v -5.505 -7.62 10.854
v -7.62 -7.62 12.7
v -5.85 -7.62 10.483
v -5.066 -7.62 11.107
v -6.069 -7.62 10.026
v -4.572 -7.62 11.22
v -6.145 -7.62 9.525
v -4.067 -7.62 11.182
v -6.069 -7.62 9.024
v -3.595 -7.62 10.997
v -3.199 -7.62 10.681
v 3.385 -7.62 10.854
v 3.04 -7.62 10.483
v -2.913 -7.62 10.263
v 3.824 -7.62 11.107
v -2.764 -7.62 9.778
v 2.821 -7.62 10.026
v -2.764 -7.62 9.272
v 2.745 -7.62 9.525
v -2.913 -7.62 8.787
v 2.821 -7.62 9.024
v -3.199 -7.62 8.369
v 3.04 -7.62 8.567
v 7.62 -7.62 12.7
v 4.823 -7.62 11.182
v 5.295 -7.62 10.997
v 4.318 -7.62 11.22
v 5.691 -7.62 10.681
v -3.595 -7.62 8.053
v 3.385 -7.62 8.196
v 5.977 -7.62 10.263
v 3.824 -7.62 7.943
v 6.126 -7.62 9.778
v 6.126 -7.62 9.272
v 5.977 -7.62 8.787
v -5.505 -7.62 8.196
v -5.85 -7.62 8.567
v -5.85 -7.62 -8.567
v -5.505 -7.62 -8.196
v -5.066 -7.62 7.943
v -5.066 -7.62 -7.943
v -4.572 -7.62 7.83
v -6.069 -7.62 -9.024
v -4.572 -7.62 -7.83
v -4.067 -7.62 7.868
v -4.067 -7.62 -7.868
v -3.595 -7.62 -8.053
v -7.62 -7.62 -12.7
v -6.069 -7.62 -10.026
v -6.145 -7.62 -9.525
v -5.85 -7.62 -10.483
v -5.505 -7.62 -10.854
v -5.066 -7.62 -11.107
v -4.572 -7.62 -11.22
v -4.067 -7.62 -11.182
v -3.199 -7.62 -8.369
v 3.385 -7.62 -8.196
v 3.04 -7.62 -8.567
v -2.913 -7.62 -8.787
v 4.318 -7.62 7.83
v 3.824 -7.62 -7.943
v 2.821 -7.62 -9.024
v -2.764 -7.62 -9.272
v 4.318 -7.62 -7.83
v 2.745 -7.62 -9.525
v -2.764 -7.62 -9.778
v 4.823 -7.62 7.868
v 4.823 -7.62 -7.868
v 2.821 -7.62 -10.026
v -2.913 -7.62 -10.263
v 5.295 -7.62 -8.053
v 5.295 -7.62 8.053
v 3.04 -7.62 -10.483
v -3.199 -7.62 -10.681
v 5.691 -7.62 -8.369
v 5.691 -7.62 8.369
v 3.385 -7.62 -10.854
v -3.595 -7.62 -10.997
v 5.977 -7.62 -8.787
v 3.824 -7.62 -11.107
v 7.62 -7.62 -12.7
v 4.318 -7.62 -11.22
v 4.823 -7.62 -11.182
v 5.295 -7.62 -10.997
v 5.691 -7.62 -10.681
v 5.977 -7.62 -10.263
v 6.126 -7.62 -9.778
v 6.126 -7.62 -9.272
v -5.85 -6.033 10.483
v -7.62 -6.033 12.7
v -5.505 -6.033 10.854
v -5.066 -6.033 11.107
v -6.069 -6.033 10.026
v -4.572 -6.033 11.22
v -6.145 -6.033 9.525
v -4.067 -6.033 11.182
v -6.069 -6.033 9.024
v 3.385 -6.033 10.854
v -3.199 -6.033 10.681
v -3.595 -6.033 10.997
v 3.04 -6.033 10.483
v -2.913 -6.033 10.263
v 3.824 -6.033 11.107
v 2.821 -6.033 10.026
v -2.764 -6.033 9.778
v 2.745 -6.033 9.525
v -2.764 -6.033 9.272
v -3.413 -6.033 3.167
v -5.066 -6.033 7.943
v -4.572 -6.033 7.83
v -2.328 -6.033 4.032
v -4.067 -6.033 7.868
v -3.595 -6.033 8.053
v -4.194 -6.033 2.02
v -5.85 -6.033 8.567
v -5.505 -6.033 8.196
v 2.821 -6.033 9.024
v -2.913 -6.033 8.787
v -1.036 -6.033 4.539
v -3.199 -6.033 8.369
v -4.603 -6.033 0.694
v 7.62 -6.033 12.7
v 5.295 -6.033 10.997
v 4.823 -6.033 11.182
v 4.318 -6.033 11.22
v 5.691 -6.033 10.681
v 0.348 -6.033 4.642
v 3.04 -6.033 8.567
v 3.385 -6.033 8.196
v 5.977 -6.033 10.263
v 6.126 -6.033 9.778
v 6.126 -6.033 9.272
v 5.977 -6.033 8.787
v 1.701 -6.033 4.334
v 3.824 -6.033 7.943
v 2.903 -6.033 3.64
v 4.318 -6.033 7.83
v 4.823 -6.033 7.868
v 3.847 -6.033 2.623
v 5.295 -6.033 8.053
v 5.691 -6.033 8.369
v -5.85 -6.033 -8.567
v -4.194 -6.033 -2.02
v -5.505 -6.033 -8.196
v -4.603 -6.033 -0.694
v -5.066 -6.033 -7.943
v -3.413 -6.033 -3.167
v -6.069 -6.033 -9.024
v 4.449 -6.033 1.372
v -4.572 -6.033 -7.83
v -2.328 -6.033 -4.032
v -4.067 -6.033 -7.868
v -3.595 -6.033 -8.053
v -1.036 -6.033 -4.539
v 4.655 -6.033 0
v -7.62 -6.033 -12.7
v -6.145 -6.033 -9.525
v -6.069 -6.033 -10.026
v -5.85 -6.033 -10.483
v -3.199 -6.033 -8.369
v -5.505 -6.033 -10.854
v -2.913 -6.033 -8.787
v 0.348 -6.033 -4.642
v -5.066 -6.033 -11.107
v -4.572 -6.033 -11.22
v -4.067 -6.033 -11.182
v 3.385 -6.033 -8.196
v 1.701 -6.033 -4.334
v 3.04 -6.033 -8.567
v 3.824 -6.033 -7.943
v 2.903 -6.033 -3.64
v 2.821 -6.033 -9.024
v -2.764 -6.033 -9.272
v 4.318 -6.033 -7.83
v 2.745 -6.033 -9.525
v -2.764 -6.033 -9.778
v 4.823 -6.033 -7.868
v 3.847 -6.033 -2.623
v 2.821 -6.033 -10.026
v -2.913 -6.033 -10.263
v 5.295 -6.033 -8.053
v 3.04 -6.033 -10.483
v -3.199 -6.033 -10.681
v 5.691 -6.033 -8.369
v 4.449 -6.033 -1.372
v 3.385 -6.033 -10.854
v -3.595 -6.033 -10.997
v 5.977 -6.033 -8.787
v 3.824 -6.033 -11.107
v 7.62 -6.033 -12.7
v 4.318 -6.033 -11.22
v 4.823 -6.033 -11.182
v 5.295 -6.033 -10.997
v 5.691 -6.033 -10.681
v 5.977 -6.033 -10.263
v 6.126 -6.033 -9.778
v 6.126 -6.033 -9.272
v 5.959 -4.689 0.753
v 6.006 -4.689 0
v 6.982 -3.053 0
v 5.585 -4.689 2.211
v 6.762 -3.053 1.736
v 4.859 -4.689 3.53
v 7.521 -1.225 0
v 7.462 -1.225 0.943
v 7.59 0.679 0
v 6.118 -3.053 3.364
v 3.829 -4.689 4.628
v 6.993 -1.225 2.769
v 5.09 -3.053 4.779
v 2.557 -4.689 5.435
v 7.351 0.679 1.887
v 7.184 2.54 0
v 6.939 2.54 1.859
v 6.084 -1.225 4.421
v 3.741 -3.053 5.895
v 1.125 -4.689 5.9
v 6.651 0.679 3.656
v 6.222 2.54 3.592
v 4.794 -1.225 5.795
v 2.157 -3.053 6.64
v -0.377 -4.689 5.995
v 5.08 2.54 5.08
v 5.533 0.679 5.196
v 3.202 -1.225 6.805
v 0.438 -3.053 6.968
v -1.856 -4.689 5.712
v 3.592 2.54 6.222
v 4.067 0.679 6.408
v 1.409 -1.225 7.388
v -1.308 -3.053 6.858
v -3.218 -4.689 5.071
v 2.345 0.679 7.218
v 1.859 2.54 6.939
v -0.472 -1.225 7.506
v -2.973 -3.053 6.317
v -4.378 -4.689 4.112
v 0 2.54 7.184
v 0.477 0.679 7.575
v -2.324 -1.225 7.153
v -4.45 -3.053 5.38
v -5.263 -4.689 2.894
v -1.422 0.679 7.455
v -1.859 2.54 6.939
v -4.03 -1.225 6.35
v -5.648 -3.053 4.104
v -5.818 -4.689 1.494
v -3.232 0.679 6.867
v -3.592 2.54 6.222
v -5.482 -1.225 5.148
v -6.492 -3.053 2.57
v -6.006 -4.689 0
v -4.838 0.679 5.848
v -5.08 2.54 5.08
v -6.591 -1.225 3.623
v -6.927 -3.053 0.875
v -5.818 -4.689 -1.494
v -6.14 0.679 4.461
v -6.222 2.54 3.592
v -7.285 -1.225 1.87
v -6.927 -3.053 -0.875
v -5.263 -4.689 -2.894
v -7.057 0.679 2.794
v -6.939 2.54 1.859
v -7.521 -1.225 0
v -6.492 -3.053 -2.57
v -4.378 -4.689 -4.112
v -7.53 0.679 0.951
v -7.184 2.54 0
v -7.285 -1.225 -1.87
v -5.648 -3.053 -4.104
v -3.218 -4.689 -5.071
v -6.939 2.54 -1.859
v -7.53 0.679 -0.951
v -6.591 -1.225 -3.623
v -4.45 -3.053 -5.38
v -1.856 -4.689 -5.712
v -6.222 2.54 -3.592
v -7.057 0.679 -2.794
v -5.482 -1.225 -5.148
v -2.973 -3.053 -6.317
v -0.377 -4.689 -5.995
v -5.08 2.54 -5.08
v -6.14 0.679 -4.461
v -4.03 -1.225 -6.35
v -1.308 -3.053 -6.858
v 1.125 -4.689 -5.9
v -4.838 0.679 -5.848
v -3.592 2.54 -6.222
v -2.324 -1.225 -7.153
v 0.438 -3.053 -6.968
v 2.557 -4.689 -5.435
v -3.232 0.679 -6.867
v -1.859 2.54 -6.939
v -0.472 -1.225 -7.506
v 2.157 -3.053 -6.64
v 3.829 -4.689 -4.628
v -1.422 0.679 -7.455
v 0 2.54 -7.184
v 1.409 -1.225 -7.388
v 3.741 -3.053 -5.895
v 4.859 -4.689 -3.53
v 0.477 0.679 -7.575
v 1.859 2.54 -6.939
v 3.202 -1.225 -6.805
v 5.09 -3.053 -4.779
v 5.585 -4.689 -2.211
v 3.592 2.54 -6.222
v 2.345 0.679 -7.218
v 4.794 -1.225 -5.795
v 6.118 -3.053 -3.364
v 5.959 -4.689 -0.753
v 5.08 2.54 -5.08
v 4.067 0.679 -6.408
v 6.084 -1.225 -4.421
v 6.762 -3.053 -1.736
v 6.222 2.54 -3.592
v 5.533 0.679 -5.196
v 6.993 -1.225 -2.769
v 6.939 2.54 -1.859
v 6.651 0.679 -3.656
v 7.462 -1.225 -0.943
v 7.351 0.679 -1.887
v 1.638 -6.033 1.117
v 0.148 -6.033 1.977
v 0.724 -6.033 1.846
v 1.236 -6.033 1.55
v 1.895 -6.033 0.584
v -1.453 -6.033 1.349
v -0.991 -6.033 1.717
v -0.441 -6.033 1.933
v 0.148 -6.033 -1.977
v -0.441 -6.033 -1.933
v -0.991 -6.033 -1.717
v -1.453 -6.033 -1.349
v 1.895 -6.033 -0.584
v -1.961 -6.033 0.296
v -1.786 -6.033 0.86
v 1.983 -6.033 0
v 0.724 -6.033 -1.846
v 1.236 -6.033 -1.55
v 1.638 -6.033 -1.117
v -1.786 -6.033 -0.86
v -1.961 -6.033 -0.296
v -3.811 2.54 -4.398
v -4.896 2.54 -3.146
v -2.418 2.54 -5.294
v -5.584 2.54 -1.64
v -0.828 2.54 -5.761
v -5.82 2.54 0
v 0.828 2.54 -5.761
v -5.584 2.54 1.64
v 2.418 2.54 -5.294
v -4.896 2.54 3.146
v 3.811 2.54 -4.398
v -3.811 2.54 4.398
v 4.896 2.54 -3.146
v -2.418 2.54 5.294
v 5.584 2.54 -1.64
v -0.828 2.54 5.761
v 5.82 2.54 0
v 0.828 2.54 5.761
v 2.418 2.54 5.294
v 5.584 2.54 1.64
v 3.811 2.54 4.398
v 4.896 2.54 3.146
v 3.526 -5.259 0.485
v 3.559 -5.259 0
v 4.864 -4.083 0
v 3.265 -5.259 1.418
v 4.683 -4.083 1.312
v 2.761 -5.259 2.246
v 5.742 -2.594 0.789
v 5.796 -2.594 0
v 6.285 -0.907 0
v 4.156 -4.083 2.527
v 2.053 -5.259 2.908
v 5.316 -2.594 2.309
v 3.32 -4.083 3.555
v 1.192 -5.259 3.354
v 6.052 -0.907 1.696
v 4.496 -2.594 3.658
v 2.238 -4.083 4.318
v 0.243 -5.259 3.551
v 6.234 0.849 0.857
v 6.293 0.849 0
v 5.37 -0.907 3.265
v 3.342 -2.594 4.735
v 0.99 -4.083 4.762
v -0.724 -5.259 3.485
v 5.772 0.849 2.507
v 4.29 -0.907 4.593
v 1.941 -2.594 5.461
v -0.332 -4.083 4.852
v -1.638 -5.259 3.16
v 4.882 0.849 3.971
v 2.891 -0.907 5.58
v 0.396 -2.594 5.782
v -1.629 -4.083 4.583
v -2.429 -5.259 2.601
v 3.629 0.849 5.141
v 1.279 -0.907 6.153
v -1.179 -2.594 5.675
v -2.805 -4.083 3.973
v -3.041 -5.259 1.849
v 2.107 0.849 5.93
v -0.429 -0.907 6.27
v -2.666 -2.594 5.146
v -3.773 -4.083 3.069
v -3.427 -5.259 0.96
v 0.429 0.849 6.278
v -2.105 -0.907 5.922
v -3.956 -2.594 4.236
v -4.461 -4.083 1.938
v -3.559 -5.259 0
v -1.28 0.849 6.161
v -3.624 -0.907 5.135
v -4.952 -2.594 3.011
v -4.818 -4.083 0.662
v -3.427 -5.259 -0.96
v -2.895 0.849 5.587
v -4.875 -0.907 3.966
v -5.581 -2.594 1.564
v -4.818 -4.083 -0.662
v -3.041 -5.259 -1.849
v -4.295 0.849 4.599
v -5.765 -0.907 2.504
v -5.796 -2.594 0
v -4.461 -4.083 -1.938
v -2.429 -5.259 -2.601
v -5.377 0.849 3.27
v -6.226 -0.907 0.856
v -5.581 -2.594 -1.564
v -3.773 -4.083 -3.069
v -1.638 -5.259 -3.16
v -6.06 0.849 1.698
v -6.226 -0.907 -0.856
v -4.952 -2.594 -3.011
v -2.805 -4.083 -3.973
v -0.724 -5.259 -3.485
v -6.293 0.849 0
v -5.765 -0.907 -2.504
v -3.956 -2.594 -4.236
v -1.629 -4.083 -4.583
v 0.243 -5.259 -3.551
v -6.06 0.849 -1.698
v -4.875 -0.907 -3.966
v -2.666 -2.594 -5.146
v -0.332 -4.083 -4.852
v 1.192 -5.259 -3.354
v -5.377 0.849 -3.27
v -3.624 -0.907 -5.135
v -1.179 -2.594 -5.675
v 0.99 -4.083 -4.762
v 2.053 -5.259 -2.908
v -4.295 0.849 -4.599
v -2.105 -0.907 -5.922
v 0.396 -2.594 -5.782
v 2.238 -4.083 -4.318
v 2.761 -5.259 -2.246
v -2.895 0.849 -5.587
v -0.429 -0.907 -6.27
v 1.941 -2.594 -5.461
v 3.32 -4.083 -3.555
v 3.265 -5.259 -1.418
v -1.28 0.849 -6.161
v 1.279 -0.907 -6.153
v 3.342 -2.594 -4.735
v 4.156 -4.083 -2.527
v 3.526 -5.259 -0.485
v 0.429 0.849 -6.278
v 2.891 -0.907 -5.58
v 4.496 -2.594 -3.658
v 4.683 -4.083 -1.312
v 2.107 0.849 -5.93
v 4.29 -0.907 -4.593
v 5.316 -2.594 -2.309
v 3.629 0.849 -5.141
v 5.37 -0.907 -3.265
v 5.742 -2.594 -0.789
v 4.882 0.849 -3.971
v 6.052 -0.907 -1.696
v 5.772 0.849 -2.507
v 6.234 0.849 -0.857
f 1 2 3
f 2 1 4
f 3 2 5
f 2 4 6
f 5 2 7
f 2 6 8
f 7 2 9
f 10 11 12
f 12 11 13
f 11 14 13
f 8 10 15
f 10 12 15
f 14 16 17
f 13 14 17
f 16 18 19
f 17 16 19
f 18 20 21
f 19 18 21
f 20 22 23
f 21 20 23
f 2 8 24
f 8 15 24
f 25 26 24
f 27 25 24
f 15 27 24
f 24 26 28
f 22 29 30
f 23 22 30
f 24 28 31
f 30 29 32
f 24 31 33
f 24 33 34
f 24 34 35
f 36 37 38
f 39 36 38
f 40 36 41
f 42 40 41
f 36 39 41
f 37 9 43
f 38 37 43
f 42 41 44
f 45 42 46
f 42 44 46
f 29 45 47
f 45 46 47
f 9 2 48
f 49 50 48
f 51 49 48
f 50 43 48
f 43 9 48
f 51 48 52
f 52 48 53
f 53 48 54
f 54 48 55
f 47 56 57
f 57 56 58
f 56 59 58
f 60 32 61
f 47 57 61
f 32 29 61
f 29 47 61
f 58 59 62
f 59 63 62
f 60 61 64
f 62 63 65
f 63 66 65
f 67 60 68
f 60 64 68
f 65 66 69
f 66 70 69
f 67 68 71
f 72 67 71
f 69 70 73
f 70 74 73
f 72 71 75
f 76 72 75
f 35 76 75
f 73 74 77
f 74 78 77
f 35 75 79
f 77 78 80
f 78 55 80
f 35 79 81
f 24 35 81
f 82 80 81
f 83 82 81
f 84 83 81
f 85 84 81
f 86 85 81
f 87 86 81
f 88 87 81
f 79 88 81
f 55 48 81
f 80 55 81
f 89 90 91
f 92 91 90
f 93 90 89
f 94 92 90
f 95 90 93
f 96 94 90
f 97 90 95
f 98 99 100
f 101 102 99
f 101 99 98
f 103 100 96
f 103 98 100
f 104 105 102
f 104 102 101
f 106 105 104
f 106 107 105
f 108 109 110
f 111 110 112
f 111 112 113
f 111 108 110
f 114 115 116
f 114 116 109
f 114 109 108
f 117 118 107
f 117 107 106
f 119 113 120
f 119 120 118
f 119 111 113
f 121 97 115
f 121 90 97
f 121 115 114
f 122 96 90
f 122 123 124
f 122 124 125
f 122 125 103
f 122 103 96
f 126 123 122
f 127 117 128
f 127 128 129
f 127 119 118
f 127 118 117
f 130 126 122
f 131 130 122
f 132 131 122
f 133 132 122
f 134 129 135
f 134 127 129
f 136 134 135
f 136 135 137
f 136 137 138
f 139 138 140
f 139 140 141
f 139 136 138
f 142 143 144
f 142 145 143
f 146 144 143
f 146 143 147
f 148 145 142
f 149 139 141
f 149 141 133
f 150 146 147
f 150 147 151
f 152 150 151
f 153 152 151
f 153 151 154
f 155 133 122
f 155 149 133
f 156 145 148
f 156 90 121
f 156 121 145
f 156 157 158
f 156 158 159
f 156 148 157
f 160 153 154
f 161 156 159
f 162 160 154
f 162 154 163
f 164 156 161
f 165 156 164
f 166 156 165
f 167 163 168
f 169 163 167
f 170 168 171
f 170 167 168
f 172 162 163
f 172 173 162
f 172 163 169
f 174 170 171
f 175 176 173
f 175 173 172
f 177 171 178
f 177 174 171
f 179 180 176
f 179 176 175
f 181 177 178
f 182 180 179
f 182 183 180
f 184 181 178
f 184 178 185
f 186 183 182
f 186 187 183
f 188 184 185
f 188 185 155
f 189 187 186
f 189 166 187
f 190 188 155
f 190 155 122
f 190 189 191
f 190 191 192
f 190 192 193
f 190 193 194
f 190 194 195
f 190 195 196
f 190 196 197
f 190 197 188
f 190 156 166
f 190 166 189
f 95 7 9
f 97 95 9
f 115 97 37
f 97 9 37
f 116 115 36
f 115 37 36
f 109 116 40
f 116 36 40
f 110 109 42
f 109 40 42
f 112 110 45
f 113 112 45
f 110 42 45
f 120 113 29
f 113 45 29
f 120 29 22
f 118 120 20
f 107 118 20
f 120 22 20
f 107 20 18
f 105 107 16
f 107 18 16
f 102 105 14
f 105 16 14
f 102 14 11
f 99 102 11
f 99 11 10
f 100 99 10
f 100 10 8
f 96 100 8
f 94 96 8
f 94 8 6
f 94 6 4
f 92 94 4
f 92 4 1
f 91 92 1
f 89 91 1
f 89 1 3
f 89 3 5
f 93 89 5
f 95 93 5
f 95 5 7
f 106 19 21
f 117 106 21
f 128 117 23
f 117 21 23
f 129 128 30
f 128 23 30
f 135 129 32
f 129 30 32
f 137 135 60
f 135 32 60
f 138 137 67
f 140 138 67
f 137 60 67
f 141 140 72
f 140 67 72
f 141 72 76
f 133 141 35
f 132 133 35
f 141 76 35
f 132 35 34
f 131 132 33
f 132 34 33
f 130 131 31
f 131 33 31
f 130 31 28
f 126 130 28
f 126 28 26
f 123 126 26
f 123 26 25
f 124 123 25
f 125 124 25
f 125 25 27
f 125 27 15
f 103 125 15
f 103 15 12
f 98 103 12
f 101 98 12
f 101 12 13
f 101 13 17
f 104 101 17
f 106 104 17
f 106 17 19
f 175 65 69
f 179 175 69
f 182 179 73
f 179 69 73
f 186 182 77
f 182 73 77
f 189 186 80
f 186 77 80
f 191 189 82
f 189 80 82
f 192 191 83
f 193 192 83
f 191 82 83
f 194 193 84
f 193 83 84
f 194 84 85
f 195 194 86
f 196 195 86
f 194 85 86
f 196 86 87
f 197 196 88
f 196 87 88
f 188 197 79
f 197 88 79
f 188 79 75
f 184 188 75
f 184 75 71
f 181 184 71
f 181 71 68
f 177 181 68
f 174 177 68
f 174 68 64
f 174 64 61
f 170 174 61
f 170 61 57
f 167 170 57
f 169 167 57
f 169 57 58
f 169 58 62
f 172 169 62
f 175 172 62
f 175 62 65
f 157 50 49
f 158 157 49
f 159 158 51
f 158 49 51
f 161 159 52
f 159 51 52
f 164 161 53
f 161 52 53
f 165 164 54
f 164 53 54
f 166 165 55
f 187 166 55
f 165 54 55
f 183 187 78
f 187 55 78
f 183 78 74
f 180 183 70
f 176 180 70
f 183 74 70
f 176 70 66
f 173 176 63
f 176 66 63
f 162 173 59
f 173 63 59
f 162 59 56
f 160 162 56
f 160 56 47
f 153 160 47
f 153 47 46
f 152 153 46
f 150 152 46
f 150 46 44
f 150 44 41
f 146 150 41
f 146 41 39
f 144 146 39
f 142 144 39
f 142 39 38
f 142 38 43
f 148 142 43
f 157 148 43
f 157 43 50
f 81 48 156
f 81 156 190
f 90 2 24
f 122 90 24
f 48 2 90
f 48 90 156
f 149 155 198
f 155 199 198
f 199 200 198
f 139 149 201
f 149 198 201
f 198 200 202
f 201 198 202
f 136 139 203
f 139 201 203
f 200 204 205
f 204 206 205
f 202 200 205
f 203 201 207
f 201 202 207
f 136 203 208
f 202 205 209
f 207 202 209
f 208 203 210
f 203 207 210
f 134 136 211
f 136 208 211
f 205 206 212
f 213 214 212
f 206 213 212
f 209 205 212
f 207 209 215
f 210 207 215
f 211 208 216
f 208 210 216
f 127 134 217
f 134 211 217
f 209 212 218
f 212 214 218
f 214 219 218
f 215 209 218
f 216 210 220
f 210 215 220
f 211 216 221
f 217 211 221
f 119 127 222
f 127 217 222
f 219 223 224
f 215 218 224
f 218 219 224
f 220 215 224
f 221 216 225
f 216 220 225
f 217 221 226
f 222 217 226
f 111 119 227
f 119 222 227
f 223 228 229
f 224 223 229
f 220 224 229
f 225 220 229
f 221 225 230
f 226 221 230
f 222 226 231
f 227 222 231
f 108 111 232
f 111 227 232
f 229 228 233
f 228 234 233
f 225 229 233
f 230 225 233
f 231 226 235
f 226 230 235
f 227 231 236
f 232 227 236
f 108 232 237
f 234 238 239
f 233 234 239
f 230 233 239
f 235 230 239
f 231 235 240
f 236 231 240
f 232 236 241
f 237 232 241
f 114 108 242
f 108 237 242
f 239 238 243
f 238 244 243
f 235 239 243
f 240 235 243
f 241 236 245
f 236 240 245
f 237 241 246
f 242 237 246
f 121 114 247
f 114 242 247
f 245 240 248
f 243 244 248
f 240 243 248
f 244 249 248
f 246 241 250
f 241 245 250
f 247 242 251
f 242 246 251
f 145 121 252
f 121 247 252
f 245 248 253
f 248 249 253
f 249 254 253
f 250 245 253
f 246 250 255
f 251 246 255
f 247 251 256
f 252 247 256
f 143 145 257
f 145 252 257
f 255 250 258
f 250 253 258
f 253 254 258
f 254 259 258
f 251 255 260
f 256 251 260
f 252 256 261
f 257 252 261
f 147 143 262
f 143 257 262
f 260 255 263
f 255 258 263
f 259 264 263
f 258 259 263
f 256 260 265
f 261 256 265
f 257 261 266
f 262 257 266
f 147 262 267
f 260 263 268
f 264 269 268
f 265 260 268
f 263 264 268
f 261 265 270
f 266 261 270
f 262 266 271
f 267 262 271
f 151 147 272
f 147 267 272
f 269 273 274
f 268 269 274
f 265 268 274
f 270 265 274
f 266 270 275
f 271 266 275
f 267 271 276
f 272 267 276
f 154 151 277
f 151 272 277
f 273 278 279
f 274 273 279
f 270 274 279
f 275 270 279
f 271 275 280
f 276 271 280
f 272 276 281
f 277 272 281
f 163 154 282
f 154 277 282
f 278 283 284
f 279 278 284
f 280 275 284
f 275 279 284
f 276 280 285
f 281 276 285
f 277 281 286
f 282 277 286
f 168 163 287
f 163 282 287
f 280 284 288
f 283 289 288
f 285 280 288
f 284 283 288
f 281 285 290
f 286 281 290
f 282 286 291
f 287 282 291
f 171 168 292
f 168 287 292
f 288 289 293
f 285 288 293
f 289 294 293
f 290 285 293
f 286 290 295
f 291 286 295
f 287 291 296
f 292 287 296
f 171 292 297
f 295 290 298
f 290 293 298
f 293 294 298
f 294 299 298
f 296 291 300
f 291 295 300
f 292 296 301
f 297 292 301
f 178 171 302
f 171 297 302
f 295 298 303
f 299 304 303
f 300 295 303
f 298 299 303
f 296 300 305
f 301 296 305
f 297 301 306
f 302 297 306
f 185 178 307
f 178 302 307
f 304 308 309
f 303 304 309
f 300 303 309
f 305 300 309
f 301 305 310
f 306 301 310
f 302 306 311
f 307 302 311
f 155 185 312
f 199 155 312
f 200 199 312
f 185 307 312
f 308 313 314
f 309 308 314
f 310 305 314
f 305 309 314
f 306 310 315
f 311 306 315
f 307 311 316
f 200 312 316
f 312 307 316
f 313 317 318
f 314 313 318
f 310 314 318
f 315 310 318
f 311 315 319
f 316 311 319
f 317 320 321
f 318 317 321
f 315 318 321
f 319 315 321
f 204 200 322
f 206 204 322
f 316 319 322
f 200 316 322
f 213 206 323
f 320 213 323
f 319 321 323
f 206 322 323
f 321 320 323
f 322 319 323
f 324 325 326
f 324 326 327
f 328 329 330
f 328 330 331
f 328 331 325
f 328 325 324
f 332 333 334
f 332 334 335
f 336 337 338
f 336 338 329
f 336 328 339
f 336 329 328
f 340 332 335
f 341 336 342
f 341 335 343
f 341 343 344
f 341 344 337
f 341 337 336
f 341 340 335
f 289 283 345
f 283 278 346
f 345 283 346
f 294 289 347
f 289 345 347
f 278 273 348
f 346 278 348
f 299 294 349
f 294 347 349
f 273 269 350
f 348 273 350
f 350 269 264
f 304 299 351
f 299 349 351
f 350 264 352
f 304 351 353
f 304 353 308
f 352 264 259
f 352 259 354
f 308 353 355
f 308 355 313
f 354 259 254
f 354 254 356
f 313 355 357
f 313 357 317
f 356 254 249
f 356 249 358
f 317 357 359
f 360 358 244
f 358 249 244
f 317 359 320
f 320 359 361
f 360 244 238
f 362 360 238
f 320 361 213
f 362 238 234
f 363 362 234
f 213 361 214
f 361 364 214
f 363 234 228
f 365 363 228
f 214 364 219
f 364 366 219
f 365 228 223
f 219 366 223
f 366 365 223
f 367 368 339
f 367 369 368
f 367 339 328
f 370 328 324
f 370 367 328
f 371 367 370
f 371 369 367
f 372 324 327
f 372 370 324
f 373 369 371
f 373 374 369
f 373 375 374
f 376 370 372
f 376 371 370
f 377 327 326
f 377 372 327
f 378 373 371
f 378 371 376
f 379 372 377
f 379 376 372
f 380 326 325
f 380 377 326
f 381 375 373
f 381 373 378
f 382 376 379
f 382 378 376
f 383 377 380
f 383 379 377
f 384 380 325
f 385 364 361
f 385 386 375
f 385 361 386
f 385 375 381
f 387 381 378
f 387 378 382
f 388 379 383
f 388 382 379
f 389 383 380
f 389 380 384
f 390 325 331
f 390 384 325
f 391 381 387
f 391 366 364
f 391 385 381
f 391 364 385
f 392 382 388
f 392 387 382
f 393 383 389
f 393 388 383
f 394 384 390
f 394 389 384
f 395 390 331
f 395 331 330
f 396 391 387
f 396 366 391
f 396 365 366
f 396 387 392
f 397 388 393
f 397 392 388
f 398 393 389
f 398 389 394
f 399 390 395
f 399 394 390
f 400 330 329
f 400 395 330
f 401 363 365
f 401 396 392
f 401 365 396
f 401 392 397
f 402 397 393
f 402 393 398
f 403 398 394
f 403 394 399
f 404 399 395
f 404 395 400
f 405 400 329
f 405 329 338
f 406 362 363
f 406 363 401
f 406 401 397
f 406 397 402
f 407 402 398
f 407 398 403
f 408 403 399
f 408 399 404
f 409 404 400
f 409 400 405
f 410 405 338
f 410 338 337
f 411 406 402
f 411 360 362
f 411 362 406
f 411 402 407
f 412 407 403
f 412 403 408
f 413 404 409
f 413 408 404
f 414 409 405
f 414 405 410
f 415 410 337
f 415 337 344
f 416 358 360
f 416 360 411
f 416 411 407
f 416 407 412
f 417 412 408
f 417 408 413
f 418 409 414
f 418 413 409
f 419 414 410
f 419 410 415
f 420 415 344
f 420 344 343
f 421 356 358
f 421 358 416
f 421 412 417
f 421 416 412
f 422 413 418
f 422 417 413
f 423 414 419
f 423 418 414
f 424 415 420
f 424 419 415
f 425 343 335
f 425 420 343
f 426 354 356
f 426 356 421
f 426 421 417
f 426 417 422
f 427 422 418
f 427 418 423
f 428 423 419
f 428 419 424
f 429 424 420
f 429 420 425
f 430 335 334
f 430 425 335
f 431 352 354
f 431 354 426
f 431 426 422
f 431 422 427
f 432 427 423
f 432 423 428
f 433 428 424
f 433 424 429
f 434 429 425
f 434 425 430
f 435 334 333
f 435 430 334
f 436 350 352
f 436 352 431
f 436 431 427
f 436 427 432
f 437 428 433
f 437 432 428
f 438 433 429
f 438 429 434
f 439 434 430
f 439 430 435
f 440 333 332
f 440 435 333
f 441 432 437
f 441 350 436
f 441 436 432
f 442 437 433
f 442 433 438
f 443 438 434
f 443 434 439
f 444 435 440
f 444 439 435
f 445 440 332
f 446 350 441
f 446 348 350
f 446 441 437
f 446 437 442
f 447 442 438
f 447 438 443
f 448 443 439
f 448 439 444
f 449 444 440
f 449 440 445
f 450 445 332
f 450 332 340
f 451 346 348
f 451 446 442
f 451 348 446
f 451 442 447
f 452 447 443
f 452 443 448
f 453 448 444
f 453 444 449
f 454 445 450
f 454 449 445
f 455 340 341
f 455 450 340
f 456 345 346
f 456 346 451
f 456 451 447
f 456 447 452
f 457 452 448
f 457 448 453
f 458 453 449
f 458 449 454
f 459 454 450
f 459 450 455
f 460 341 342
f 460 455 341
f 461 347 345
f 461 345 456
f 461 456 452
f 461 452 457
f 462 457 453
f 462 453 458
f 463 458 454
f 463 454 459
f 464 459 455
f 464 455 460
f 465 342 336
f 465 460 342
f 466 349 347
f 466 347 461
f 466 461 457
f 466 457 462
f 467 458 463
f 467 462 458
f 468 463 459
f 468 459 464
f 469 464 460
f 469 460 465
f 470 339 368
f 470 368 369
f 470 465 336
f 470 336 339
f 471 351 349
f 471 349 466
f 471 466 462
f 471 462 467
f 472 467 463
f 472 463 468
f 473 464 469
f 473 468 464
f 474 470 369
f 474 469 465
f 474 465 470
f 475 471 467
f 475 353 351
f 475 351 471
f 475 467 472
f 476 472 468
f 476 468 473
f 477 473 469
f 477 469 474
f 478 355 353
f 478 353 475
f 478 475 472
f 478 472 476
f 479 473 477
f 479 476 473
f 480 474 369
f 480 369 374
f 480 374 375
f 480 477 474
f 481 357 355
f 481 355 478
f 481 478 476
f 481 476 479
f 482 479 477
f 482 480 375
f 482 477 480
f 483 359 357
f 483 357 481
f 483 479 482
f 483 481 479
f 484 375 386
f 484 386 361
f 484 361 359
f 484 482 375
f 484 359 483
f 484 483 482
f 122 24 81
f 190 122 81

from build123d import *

# Parameters (mm, degrees)
SKETCH2_W            = 17.78
SKETCH2_H            = 6.35
CUT_EXTRUDE1_DEPTH   = 12.7
SHELL1_T             = -1.27
SKETCH3_W            = 15.24
SKETCH3_H            = 25.4
BOSS_EXTRUDE1_DEPTH  = 1.5875
M3_CLEARANCE_HOLE1_D = 3.4


with BuildPart() as part:
    # Sketch1 → Revolve1 (revolve)
    with BuildSketch(Plane.XY):
        with BuildLine():
            Line((0, 7.62), (0, -7.62))
            ThreePointArc((0, -7.62), (7.62, 0), (0, 7.62))
        make_face()
    revolve(axis=Axis((0, 7.62, 0), (0, -1, 0)))

    # Sketch2 → Cut-Extrude1 (cut, symmetric)
    with BuildSketch(Plane.XY):
        with Locations((0, 5.715)):
            Rectangle(SKETCH2_W, SKETCH2_H)
    extrude(amount=CUT_EXTRUDE1_DEPTH, both=True, mode=Mode.SUBTRACT)

    # Shell1
    shell1_openings = [part.faces().sort_by_distance(p)[0] for p in [
        (0, 2.54, 0),
    ]]
    offset(amount=SHELL1_T, openings=shell1_openings, kind=Kind.INTERSECTION)

    # Sketch3 → Boss-Extrude1 (add)
    with BuildSketch(Plane(origin=(0, -7.62, 0), x_dir=(1, 0, 0), z_dir=(0, 1, 0))):
        Rectangle(SKETCH3_W, SKETCH3_H)
    extrude(amount=BOSS_EXTRUDE1_DEPTH)

    # M3 Clearance Hole1 (through all)
    with Locations(Plane(origin=(0, -6.0325, 0), x_dir=(1, 0, 0), z_dir=(0, 1, 0))):
        with Locations((-4.445, -9.525), (-4.445, 9.525), (4.445, 9.525), (4.445, -9.525)):
            Hole(M3_CLEARANCE_HOLE1_D / 2)


solid = part.part
